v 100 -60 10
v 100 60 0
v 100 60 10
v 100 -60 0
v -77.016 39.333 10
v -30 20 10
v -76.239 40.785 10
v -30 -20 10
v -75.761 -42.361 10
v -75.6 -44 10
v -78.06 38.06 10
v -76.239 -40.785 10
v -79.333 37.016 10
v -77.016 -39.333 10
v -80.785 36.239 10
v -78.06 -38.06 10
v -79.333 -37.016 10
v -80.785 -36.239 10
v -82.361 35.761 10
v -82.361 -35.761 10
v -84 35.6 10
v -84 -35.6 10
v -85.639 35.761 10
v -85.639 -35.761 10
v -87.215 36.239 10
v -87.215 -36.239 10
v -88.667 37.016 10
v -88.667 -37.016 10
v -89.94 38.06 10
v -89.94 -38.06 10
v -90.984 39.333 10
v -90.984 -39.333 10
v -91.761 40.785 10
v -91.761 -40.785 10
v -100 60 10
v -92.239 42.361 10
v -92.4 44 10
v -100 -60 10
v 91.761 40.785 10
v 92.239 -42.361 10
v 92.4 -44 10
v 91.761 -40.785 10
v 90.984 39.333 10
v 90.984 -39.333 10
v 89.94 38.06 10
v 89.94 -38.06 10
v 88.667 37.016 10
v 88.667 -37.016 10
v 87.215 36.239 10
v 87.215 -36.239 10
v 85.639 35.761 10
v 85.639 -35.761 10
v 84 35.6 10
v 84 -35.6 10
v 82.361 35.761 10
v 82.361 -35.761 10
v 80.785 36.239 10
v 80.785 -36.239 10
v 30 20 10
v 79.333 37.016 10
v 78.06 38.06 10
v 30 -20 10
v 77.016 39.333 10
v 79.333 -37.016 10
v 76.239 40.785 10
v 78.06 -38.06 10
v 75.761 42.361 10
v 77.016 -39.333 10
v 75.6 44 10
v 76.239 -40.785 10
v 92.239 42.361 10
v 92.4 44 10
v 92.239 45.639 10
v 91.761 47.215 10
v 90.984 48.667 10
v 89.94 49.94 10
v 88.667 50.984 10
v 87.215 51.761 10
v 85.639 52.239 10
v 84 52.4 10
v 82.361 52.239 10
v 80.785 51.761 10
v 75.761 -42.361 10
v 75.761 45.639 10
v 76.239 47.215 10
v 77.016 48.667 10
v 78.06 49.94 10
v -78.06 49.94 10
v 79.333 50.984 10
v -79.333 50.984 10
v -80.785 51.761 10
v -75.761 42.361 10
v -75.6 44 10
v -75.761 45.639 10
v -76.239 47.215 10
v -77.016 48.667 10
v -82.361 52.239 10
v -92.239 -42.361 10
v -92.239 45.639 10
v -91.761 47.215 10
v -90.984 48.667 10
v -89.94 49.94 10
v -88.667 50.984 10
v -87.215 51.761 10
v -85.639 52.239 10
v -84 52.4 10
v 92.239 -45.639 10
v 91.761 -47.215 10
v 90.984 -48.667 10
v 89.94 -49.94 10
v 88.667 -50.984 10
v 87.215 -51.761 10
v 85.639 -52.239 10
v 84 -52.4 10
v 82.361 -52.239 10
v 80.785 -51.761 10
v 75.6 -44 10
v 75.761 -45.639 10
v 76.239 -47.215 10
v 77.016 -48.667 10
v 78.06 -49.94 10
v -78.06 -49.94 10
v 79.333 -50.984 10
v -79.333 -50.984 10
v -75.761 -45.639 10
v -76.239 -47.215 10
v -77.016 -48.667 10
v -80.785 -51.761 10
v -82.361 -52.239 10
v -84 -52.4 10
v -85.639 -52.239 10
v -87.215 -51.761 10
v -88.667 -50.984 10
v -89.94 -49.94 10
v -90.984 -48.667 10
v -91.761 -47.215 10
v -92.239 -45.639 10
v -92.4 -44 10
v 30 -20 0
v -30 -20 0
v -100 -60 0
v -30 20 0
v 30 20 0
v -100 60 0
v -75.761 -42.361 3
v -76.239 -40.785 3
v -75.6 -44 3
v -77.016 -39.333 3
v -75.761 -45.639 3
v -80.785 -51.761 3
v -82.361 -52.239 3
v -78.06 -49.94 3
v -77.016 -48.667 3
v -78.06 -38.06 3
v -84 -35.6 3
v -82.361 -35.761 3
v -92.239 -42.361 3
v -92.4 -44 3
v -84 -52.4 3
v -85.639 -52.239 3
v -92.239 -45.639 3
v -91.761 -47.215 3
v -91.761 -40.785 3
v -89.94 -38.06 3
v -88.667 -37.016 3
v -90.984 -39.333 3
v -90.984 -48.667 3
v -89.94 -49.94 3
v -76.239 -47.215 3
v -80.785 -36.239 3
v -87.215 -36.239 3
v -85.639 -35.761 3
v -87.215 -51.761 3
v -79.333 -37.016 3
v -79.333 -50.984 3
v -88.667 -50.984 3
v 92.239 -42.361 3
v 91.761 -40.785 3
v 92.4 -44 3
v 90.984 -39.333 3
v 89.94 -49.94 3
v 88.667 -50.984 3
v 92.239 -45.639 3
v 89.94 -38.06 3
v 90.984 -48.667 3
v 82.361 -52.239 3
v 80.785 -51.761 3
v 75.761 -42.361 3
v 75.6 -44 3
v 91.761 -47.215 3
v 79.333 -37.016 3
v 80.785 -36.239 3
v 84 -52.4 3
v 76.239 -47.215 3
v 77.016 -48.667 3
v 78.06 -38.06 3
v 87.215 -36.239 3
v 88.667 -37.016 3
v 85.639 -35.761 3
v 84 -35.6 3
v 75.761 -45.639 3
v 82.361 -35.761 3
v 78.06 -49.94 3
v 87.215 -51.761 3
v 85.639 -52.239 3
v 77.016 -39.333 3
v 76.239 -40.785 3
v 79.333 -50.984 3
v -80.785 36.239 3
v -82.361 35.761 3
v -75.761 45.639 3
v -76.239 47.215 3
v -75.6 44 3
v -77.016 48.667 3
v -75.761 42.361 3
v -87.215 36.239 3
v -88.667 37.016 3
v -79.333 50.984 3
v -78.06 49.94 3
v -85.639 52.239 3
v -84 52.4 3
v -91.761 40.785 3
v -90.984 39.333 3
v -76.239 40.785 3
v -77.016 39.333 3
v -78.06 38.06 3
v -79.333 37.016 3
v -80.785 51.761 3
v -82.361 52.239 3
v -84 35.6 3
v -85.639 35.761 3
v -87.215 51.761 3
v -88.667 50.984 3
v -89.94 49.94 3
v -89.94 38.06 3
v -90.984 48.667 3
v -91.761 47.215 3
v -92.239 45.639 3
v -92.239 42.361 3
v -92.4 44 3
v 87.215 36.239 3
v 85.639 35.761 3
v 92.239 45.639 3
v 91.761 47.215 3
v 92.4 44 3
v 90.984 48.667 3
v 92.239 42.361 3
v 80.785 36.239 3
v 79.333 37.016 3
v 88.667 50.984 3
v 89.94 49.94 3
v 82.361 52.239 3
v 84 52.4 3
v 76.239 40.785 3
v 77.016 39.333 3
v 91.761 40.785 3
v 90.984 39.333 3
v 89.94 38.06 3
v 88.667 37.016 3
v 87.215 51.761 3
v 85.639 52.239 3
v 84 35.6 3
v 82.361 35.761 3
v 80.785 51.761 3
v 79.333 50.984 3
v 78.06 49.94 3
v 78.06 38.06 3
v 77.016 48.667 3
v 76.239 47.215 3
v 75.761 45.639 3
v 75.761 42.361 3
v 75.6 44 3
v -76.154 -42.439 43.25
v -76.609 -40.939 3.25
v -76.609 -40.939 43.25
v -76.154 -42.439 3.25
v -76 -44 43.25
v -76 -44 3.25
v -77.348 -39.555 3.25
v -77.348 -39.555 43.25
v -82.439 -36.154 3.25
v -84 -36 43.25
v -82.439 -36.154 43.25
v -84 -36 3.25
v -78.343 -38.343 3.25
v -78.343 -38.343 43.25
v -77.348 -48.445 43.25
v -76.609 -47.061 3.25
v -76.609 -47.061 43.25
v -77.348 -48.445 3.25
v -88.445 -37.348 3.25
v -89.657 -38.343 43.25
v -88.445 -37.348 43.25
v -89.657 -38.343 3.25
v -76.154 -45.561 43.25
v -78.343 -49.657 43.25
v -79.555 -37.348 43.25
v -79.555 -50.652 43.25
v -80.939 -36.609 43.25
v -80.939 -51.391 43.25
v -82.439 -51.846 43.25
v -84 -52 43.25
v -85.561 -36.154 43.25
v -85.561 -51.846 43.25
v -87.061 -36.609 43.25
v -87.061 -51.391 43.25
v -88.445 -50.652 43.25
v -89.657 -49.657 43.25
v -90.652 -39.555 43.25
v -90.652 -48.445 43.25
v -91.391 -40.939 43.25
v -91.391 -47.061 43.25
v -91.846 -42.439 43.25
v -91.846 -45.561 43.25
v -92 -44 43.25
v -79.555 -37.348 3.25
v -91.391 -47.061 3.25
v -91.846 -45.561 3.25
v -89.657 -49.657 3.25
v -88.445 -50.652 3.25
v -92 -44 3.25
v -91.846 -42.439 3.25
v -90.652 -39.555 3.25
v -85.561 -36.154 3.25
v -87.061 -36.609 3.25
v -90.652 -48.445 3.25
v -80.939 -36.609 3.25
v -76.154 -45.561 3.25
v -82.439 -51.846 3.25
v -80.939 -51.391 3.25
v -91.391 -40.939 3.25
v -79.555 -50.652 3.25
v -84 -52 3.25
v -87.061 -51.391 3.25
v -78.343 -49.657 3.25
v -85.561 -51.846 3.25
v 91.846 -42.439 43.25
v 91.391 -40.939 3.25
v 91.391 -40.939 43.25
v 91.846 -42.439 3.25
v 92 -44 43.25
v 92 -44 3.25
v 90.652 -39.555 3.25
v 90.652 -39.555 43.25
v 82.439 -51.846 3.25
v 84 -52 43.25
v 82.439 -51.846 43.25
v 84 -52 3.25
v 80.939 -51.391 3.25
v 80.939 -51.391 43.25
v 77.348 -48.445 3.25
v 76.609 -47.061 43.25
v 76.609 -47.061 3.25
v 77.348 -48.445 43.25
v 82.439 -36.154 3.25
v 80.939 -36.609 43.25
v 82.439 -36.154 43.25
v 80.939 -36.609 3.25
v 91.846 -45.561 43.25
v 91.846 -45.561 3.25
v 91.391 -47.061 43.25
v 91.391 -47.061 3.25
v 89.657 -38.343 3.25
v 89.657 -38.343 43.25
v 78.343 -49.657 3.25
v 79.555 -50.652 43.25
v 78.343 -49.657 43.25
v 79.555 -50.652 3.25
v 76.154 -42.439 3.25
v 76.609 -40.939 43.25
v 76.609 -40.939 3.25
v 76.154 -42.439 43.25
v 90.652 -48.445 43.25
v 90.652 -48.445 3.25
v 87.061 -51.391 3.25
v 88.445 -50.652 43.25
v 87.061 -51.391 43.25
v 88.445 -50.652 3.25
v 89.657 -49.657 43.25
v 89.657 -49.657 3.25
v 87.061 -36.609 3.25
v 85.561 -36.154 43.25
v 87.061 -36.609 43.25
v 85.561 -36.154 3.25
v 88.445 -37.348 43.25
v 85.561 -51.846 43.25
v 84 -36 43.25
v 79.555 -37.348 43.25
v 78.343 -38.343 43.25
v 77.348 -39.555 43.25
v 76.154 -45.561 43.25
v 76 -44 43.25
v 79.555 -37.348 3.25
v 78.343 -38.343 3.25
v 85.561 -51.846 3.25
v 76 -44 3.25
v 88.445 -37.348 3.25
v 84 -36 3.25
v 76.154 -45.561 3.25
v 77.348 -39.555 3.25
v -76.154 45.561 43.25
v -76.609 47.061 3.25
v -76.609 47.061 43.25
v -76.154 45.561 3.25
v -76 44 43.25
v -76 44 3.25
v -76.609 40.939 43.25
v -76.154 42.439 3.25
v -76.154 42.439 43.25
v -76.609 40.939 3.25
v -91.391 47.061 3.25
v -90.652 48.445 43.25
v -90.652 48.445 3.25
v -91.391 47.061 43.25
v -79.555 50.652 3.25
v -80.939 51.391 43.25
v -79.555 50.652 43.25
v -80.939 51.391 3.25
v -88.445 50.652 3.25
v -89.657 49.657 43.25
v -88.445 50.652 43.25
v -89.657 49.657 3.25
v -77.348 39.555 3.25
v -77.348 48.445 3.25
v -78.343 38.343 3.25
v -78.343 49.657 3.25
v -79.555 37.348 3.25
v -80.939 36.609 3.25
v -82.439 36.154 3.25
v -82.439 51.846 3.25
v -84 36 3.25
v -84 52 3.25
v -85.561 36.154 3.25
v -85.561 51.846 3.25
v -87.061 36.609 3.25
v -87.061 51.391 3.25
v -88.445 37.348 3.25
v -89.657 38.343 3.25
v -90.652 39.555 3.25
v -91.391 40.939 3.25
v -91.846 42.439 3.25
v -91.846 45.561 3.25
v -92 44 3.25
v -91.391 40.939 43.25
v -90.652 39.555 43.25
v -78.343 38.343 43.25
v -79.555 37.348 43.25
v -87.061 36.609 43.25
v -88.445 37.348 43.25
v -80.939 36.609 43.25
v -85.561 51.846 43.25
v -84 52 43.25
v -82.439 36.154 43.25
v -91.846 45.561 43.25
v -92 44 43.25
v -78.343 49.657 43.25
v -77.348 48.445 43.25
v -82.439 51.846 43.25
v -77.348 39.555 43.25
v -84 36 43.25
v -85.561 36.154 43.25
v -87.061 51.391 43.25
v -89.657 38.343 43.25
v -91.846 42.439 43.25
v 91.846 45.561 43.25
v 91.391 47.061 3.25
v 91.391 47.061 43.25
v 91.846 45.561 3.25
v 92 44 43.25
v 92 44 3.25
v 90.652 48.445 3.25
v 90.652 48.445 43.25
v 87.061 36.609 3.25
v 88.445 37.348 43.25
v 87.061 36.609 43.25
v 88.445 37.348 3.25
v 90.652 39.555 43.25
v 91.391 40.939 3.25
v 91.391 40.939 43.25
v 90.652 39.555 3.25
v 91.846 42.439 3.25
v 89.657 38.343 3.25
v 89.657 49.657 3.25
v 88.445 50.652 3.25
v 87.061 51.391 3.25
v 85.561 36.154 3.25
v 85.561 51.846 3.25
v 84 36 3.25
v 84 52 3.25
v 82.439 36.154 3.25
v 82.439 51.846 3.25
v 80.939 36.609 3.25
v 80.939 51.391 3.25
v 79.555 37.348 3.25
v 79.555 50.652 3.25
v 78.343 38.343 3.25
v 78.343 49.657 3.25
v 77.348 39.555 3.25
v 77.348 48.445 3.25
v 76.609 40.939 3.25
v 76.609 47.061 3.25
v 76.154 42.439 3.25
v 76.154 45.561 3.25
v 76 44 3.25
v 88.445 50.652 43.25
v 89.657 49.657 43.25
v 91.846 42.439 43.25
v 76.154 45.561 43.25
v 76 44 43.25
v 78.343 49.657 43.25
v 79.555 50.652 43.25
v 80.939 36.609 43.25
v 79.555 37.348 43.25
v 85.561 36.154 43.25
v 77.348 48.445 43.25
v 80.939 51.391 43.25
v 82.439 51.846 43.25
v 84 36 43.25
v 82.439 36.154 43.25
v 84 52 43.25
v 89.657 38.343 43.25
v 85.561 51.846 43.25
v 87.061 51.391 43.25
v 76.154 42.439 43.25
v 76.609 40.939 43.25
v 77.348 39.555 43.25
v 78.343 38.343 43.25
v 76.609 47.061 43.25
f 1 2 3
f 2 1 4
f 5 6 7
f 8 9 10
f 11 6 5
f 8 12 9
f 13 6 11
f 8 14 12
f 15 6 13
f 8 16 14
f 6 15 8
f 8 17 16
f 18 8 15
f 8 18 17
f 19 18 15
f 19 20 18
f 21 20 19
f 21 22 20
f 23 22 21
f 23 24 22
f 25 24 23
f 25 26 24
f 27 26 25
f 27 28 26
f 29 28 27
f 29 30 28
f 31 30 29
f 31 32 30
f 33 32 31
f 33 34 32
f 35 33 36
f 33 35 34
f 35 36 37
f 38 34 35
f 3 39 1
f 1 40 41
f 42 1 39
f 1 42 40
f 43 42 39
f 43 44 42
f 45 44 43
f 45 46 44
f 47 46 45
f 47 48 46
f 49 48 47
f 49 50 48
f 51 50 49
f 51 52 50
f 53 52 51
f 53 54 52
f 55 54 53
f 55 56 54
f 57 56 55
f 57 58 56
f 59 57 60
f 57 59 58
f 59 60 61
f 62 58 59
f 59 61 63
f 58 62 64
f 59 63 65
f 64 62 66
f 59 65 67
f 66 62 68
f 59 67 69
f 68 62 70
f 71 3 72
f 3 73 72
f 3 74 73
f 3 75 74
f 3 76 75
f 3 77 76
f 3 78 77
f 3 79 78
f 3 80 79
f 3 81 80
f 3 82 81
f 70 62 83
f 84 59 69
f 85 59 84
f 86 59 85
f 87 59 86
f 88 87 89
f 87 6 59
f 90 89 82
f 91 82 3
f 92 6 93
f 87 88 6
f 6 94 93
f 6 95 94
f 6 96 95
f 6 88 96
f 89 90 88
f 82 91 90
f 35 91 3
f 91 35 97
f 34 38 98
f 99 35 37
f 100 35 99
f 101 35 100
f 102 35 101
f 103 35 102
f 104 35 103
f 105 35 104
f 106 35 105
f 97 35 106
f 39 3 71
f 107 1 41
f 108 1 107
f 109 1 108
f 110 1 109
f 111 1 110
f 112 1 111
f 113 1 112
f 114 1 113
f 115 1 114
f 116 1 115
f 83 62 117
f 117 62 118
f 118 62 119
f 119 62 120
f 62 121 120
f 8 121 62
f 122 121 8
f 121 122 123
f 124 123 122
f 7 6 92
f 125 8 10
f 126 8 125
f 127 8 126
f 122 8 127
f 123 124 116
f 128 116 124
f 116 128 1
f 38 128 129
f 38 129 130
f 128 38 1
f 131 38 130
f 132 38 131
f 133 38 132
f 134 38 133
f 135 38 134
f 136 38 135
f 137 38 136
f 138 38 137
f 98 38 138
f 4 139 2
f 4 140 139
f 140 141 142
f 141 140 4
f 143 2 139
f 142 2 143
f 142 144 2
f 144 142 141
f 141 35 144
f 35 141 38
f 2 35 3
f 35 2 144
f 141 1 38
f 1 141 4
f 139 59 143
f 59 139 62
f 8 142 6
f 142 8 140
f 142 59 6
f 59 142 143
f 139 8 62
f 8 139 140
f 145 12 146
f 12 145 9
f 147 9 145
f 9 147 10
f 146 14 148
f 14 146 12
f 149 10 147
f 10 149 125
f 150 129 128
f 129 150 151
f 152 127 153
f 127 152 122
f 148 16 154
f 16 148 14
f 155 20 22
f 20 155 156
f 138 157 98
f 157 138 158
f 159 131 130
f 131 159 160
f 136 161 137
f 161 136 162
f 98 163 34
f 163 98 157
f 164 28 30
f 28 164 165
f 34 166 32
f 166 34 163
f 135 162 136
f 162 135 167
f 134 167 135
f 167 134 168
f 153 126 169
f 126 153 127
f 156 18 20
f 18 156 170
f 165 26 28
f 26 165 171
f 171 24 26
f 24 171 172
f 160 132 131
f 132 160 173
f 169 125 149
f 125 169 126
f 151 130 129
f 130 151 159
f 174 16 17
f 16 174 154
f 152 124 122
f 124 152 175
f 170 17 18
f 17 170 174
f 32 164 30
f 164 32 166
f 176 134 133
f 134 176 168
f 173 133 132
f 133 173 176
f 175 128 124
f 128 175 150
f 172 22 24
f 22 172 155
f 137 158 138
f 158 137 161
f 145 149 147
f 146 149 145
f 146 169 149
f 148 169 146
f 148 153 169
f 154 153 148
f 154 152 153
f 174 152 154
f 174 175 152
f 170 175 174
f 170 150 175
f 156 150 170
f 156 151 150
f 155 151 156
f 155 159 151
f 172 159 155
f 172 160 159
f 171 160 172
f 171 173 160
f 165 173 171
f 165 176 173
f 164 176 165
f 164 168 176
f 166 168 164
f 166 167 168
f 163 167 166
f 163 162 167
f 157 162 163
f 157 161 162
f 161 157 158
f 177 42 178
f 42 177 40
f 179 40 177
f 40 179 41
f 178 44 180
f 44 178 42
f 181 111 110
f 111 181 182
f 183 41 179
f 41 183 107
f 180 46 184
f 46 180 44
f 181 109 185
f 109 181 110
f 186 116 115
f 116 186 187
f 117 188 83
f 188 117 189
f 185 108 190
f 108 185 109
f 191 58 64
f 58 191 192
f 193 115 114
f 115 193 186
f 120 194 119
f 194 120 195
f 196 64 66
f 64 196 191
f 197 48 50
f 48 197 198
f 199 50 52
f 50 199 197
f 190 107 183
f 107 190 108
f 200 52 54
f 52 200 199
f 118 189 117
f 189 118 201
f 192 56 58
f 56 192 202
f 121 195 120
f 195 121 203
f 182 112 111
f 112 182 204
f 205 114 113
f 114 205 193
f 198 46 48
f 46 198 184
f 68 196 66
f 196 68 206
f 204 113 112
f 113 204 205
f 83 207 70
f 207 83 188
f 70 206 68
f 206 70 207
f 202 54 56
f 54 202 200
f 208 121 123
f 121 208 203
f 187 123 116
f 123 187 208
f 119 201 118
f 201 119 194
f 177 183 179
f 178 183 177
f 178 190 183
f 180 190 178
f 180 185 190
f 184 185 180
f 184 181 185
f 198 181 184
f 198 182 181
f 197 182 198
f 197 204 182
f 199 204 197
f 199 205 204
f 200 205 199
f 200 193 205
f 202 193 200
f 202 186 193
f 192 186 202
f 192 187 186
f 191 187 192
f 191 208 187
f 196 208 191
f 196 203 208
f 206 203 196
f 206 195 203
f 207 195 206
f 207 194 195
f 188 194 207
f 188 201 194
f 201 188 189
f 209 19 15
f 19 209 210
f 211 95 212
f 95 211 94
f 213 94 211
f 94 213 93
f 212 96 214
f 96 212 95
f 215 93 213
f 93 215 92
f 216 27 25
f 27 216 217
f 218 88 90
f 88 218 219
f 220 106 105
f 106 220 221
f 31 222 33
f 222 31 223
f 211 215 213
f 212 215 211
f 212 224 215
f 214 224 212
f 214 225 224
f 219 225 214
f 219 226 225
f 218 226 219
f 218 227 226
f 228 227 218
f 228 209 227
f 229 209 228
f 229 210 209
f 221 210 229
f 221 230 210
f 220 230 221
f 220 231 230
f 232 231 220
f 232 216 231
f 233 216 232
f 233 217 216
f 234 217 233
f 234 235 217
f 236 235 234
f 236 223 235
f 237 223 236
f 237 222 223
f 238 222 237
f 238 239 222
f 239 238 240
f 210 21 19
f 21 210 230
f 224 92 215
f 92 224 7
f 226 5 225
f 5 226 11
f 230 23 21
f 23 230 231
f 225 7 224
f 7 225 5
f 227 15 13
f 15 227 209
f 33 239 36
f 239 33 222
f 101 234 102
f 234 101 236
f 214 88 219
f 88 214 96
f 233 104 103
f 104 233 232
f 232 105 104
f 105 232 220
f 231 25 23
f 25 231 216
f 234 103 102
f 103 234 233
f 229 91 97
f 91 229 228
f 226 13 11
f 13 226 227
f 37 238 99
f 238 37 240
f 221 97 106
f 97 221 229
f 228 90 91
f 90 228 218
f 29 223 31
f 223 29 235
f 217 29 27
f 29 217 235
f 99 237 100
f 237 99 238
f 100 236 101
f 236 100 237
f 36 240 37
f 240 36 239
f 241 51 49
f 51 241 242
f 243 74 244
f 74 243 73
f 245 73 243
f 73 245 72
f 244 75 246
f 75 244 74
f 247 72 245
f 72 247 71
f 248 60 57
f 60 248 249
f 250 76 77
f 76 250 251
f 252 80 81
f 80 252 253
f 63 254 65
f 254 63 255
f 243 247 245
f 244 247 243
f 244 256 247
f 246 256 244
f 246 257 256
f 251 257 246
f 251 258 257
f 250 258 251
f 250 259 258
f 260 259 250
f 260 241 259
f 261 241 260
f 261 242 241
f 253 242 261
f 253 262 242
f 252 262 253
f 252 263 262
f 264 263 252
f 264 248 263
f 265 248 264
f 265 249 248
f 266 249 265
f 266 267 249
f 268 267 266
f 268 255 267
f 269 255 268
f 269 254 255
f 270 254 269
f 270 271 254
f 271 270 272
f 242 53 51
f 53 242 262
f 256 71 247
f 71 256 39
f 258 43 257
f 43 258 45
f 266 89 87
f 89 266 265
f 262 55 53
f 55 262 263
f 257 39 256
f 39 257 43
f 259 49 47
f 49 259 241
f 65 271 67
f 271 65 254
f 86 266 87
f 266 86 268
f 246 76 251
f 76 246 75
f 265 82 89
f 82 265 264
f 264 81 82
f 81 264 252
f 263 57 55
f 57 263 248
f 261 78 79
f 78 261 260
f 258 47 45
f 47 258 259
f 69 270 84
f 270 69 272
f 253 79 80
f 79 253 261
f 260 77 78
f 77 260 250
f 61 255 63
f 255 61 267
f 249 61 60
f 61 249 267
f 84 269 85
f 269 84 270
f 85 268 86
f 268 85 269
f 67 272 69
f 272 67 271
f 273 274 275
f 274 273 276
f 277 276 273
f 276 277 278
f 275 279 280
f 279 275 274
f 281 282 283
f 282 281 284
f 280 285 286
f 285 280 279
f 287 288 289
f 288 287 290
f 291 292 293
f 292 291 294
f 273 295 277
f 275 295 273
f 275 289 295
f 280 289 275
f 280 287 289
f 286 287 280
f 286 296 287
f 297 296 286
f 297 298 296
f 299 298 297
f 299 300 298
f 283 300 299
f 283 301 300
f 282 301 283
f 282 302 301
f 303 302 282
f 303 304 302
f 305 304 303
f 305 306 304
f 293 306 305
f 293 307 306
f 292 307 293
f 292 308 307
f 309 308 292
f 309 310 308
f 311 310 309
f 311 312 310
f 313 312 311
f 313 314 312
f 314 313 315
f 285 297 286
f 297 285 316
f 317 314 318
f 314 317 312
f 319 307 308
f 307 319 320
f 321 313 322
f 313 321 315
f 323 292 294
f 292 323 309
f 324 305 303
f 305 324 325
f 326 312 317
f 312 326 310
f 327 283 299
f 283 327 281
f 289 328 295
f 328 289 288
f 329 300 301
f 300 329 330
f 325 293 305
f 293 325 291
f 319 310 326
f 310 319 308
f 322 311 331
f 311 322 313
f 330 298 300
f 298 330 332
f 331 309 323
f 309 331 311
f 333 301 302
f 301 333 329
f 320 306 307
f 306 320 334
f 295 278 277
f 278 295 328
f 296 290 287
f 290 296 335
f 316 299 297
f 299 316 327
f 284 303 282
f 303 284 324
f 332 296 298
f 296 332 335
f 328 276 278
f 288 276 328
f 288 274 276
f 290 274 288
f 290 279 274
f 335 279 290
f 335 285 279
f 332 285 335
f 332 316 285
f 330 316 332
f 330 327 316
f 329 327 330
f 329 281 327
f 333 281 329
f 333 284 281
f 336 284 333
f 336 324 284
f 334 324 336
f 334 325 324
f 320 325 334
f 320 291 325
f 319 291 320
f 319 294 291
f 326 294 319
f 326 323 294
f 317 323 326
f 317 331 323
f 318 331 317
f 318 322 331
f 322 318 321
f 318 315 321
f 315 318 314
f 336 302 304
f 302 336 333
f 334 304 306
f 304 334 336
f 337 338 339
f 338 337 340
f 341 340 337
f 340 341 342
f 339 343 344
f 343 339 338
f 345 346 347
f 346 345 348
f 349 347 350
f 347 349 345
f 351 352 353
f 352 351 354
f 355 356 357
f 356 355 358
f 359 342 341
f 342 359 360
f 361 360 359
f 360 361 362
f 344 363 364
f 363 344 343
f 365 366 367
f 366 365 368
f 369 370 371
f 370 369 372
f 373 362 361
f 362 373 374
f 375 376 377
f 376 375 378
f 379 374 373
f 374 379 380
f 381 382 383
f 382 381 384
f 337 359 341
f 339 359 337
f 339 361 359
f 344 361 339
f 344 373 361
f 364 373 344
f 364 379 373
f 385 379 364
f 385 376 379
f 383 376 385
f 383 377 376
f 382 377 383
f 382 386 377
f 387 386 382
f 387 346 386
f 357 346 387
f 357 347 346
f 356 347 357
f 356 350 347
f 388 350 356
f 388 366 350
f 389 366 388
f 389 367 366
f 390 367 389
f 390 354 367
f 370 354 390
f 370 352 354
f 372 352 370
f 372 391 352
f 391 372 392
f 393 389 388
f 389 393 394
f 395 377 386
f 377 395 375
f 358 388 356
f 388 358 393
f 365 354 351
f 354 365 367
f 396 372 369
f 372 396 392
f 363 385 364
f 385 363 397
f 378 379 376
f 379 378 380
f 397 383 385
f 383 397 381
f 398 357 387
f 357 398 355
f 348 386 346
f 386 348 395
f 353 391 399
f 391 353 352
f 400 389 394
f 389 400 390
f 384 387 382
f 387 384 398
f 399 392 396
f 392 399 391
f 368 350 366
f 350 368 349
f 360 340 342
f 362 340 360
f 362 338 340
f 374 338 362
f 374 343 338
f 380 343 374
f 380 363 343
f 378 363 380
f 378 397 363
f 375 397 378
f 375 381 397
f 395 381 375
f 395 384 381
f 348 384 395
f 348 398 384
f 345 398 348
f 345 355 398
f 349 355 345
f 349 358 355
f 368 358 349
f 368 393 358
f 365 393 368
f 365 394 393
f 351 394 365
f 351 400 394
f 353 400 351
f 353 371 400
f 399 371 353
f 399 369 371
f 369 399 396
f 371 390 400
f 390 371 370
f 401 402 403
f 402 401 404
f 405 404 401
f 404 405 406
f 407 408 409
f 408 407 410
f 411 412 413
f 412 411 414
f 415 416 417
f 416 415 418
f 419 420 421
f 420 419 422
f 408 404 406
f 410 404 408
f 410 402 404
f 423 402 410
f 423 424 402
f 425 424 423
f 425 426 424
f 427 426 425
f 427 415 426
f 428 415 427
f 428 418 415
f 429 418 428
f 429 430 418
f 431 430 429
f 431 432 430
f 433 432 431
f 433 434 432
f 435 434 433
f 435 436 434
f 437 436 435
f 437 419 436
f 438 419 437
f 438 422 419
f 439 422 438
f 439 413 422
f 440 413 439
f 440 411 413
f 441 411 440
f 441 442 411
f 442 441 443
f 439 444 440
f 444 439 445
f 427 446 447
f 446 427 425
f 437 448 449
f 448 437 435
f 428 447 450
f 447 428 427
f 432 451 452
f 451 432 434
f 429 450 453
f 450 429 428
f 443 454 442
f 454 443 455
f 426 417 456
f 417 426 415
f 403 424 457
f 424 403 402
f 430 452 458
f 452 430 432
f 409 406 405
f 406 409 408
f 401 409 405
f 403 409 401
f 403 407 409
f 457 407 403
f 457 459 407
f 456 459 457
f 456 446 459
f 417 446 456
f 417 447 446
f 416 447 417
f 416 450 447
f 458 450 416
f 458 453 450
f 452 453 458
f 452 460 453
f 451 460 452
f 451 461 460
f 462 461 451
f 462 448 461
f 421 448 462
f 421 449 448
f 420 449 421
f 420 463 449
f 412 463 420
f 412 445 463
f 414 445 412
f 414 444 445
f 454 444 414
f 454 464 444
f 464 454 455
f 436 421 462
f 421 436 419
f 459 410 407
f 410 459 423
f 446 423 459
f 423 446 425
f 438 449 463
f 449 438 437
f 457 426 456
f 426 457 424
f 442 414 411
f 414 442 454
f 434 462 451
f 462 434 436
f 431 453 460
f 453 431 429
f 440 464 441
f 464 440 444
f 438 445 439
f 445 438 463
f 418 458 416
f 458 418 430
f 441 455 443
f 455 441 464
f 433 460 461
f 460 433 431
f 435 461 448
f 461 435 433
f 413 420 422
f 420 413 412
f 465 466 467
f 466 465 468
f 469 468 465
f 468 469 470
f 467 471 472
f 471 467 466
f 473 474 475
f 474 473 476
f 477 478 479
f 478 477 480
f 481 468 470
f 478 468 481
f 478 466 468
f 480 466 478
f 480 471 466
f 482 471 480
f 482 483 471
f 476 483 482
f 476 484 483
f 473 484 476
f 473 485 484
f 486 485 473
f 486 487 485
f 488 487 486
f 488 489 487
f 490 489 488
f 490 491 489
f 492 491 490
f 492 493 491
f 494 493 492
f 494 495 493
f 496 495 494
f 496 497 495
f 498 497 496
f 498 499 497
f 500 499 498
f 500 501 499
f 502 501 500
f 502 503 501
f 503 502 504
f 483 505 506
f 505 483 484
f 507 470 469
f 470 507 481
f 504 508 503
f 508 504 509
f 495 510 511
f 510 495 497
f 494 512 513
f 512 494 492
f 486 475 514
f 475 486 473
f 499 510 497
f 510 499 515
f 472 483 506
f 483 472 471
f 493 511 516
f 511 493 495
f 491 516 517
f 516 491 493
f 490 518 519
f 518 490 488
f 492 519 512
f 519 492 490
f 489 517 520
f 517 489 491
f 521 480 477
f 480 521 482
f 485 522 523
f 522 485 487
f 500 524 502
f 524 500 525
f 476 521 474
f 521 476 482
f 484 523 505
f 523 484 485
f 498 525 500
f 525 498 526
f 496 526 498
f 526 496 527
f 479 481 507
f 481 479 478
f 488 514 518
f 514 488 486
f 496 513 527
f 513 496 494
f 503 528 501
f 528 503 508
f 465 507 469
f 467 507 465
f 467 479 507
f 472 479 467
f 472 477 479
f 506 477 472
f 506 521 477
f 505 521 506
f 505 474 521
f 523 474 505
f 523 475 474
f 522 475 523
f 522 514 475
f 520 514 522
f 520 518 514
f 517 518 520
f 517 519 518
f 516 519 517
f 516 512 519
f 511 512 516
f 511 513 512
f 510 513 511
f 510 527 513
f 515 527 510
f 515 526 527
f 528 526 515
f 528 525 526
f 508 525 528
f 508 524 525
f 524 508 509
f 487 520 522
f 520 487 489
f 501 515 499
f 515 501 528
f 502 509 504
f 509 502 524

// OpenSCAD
$fn = 32;

// ------------------------------------------------------------------------
// Frame with four posts: 200 x 120 mm frame, four d16 posts
// Every part is its own module, assembly() places them once.
// ------------------------------------------------------------------------

// --- part 1 ---
module base_frame() {
  difference() {
    translate([-100, -60, 0]) cube([200, 120, 10]);
    translate([-30, -20, -1]) cube([60, 40, 12]);
    translate([-84, -44, 3]) cylinder(h = 8, d = 16.8);
    translate([84, -44, 3]) cylinder(h = 8, d = 16.8);
    translate([-84, 44, 3]) cylinder(h = 8, d = 16.8);
    translate([84, 44, 3]) cylinder(h = 8, d = 16.8);
  }
}

// --- part 2 ---
module post1() {
  cylinder(h = 40, d = 16);
}

// --- part 3 ---
module post2() {
  cylinder(h = 40, d = 16);
}

// --- part 4 ---
module post3() {
  cylinder(h = 40, d = 16);
}

// --- part 5 ---
module post4() {
  cylinder(h = 40, d = 16);
}

// --- assembly ---
module assembly() {
  translate([0, 0, 0]) rotate([0, 0, 0]) base_frame();
  translate([-84, -44, 3.25]) rotate([0, 0, 0]) post1();
  translate([84, -44, 3.25]) rotate([0, 0, 0]) post2();
  translate([-84, 44, 3.25]) rotate([0, 0, 0]) post3();
  translate([84, 44, 3.25]) rotate([0, 0, 0]) post4();
}

assembly();
